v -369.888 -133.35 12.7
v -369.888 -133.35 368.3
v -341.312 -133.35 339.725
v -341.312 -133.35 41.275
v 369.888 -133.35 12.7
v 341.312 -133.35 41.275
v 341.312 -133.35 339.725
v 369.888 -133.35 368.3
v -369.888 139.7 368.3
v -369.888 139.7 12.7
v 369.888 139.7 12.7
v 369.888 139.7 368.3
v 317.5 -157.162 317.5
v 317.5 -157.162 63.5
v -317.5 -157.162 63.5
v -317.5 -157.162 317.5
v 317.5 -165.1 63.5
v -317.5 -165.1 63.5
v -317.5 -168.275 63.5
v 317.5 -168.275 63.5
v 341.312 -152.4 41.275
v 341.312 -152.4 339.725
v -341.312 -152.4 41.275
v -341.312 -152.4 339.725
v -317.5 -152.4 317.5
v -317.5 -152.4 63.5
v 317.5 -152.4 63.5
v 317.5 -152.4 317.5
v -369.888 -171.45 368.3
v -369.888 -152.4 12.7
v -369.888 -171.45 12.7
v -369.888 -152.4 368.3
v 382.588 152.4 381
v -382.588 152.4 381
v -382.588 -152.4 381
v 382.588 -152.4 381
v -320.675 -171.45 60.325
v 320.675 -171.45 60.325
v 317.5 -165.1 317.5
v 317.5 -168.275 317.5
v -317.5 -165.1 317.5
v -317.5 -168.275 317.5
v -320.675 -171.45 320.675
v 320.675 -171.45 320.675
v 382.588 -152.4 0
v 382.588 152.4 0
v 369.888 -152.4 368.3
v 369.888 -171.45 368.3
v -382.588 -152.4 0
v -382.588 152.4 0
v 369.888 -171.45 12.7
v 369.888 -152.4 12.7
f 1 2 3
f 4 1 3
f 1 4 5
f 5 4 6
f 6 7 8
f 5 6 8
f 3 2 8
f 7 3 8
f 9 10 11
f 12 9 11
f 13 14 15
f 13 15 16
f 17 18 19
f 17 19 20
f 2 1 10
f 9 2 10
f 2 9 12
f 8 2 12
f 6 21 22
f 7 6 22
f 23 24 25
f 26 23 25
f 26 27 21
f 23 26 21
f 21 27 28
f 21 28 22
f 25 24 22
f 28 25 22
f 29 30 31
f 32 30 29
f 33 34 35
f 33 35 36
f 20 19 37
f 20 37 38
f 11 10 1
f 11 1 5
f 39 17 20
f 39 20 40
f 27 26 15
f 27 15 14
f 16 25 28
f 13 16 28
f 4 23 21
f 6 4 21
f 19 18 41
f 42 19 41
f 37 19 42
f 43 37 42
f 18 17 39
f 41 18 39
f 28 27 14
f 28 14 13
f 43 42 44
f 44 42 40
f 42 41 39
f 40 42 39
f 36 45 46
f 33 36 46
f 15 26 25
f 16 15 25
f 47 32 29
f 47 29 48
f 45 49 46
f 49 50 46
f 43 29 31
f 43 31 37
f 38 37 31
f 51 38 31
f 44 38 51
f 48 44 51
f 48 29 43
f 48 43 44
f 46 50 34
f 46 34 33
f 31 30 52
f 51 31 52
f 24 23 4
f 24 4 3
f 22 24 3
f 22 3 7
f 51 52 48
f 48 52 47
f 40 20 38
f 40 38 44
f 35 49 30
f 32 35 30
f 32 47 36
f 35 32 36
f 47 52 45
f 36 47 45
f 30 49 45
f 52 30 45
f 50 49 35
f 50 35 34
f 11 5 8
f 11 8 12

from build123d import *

# Parameters (mm, degrees)
F0_W     = 765.175
F0_H     = 304.8
F1_DEPTH = 381
F2_T     = -12.7
F3_W     = 765.175
F3_H     = 381
F3_W_2   = 749.3
F3_H_2   = 368.3
F3_W_3   = 739.775
F3_H_3   = 355.6
F3_W_4   = 682.625
F3_H_4   = 298.45
F4_DEPTH = 19.05
F3_W_5   = 635
F3_H_5   = 254
F5_DEPTH = 19.05
F6_W     = 7.9375
F6_H     = 254
F7_DEPTH = 635
F8_SIZE  = 3.175


with BuildPart() as f1:
    # F0 (on Top) → F1 (new body)
    with BuildSketch(Plane.XY):
        Rectangle(F0_W, F0_H)
    extrude(amount=F1_DEPTH)

    # F2
    f2_openings = [f1.faces().sort_by_distance(p)[0] for p in [
        (0, -152.4, 190.5),
    ]]
    offset(amount=F2_T, openings=f2_openings)

    # F3 (on face) → F4 (join)
    with BuildSketch(Plane.XZ.offset(152.4)):
        with Locations((0, 190.5)):
            Rectangle(F3_W, F3_H)
        with Locations((0, 190.5)):
            Rectangle(F3_W_2, F3_H_2, mode=Mode.SUBTRACT)
        with Locations((0, 190.5)):
            Rectangle(F3_W_2, F3_H_2)
        with Locations((0, 190.5)):
            Rectangle(F3_W_3, F3_H_3, mode=Mode.SUBTRACT)
        with Locations((0, 190.5)):
            Rectangle(F3_W_3, F3_H_3)
        with Locations((0, 190.5)):
            Rectangle(F3_W_4, F3_H_4, mode=Mode.SUBTRACT)
    extrude(amount=-F4_DEPTH)

    # F3 (on face) → F5 (join)
    with BuildSketch(Plane.XZ.offset(152.4)):
        with Locations((0, 190.5)):
            Rectangle(F3_W_3, F3_H_3)
        with Locations((0, 190.5)):
            Rectangle(F3_W_4, F3_H_4, mode=Mode.SUBTRACT)
        with Locations((0, 190.5)):
            Rectangle(F3_W_4, F3_H_4)
        with Locations((0, 190.5)):
            Rectangle(F3_W_5, F3_H_5, mode=Mode.SUBTRACT)
    extrude(amount=F5_DEPTH)

    # F6 (on face) → F7 (join, through all)
    with BuildSketch(Plane(origin=(317.5, 0, 0), x_dir=(0, -1, 0), z_dir=(-1, 0, 0))):
        with Locations((161.13125, 190.5)):
            Rectangle(F6_W, F6_H)
    extrude(amount=F7_DEPTH)

    # F8
    f8_edges = [f1.edges().sort_by_distance(p)[0] for p in [
        (0, -171.45, 63.5),
        (-317.5, -171.45, 190.5),
        (0, -171.45, 317.5),
        (317.5, -171.45, 190.5),
    ]]
    chamfer(f8_edges, length=F8_SIZE)


solid = f1.part
